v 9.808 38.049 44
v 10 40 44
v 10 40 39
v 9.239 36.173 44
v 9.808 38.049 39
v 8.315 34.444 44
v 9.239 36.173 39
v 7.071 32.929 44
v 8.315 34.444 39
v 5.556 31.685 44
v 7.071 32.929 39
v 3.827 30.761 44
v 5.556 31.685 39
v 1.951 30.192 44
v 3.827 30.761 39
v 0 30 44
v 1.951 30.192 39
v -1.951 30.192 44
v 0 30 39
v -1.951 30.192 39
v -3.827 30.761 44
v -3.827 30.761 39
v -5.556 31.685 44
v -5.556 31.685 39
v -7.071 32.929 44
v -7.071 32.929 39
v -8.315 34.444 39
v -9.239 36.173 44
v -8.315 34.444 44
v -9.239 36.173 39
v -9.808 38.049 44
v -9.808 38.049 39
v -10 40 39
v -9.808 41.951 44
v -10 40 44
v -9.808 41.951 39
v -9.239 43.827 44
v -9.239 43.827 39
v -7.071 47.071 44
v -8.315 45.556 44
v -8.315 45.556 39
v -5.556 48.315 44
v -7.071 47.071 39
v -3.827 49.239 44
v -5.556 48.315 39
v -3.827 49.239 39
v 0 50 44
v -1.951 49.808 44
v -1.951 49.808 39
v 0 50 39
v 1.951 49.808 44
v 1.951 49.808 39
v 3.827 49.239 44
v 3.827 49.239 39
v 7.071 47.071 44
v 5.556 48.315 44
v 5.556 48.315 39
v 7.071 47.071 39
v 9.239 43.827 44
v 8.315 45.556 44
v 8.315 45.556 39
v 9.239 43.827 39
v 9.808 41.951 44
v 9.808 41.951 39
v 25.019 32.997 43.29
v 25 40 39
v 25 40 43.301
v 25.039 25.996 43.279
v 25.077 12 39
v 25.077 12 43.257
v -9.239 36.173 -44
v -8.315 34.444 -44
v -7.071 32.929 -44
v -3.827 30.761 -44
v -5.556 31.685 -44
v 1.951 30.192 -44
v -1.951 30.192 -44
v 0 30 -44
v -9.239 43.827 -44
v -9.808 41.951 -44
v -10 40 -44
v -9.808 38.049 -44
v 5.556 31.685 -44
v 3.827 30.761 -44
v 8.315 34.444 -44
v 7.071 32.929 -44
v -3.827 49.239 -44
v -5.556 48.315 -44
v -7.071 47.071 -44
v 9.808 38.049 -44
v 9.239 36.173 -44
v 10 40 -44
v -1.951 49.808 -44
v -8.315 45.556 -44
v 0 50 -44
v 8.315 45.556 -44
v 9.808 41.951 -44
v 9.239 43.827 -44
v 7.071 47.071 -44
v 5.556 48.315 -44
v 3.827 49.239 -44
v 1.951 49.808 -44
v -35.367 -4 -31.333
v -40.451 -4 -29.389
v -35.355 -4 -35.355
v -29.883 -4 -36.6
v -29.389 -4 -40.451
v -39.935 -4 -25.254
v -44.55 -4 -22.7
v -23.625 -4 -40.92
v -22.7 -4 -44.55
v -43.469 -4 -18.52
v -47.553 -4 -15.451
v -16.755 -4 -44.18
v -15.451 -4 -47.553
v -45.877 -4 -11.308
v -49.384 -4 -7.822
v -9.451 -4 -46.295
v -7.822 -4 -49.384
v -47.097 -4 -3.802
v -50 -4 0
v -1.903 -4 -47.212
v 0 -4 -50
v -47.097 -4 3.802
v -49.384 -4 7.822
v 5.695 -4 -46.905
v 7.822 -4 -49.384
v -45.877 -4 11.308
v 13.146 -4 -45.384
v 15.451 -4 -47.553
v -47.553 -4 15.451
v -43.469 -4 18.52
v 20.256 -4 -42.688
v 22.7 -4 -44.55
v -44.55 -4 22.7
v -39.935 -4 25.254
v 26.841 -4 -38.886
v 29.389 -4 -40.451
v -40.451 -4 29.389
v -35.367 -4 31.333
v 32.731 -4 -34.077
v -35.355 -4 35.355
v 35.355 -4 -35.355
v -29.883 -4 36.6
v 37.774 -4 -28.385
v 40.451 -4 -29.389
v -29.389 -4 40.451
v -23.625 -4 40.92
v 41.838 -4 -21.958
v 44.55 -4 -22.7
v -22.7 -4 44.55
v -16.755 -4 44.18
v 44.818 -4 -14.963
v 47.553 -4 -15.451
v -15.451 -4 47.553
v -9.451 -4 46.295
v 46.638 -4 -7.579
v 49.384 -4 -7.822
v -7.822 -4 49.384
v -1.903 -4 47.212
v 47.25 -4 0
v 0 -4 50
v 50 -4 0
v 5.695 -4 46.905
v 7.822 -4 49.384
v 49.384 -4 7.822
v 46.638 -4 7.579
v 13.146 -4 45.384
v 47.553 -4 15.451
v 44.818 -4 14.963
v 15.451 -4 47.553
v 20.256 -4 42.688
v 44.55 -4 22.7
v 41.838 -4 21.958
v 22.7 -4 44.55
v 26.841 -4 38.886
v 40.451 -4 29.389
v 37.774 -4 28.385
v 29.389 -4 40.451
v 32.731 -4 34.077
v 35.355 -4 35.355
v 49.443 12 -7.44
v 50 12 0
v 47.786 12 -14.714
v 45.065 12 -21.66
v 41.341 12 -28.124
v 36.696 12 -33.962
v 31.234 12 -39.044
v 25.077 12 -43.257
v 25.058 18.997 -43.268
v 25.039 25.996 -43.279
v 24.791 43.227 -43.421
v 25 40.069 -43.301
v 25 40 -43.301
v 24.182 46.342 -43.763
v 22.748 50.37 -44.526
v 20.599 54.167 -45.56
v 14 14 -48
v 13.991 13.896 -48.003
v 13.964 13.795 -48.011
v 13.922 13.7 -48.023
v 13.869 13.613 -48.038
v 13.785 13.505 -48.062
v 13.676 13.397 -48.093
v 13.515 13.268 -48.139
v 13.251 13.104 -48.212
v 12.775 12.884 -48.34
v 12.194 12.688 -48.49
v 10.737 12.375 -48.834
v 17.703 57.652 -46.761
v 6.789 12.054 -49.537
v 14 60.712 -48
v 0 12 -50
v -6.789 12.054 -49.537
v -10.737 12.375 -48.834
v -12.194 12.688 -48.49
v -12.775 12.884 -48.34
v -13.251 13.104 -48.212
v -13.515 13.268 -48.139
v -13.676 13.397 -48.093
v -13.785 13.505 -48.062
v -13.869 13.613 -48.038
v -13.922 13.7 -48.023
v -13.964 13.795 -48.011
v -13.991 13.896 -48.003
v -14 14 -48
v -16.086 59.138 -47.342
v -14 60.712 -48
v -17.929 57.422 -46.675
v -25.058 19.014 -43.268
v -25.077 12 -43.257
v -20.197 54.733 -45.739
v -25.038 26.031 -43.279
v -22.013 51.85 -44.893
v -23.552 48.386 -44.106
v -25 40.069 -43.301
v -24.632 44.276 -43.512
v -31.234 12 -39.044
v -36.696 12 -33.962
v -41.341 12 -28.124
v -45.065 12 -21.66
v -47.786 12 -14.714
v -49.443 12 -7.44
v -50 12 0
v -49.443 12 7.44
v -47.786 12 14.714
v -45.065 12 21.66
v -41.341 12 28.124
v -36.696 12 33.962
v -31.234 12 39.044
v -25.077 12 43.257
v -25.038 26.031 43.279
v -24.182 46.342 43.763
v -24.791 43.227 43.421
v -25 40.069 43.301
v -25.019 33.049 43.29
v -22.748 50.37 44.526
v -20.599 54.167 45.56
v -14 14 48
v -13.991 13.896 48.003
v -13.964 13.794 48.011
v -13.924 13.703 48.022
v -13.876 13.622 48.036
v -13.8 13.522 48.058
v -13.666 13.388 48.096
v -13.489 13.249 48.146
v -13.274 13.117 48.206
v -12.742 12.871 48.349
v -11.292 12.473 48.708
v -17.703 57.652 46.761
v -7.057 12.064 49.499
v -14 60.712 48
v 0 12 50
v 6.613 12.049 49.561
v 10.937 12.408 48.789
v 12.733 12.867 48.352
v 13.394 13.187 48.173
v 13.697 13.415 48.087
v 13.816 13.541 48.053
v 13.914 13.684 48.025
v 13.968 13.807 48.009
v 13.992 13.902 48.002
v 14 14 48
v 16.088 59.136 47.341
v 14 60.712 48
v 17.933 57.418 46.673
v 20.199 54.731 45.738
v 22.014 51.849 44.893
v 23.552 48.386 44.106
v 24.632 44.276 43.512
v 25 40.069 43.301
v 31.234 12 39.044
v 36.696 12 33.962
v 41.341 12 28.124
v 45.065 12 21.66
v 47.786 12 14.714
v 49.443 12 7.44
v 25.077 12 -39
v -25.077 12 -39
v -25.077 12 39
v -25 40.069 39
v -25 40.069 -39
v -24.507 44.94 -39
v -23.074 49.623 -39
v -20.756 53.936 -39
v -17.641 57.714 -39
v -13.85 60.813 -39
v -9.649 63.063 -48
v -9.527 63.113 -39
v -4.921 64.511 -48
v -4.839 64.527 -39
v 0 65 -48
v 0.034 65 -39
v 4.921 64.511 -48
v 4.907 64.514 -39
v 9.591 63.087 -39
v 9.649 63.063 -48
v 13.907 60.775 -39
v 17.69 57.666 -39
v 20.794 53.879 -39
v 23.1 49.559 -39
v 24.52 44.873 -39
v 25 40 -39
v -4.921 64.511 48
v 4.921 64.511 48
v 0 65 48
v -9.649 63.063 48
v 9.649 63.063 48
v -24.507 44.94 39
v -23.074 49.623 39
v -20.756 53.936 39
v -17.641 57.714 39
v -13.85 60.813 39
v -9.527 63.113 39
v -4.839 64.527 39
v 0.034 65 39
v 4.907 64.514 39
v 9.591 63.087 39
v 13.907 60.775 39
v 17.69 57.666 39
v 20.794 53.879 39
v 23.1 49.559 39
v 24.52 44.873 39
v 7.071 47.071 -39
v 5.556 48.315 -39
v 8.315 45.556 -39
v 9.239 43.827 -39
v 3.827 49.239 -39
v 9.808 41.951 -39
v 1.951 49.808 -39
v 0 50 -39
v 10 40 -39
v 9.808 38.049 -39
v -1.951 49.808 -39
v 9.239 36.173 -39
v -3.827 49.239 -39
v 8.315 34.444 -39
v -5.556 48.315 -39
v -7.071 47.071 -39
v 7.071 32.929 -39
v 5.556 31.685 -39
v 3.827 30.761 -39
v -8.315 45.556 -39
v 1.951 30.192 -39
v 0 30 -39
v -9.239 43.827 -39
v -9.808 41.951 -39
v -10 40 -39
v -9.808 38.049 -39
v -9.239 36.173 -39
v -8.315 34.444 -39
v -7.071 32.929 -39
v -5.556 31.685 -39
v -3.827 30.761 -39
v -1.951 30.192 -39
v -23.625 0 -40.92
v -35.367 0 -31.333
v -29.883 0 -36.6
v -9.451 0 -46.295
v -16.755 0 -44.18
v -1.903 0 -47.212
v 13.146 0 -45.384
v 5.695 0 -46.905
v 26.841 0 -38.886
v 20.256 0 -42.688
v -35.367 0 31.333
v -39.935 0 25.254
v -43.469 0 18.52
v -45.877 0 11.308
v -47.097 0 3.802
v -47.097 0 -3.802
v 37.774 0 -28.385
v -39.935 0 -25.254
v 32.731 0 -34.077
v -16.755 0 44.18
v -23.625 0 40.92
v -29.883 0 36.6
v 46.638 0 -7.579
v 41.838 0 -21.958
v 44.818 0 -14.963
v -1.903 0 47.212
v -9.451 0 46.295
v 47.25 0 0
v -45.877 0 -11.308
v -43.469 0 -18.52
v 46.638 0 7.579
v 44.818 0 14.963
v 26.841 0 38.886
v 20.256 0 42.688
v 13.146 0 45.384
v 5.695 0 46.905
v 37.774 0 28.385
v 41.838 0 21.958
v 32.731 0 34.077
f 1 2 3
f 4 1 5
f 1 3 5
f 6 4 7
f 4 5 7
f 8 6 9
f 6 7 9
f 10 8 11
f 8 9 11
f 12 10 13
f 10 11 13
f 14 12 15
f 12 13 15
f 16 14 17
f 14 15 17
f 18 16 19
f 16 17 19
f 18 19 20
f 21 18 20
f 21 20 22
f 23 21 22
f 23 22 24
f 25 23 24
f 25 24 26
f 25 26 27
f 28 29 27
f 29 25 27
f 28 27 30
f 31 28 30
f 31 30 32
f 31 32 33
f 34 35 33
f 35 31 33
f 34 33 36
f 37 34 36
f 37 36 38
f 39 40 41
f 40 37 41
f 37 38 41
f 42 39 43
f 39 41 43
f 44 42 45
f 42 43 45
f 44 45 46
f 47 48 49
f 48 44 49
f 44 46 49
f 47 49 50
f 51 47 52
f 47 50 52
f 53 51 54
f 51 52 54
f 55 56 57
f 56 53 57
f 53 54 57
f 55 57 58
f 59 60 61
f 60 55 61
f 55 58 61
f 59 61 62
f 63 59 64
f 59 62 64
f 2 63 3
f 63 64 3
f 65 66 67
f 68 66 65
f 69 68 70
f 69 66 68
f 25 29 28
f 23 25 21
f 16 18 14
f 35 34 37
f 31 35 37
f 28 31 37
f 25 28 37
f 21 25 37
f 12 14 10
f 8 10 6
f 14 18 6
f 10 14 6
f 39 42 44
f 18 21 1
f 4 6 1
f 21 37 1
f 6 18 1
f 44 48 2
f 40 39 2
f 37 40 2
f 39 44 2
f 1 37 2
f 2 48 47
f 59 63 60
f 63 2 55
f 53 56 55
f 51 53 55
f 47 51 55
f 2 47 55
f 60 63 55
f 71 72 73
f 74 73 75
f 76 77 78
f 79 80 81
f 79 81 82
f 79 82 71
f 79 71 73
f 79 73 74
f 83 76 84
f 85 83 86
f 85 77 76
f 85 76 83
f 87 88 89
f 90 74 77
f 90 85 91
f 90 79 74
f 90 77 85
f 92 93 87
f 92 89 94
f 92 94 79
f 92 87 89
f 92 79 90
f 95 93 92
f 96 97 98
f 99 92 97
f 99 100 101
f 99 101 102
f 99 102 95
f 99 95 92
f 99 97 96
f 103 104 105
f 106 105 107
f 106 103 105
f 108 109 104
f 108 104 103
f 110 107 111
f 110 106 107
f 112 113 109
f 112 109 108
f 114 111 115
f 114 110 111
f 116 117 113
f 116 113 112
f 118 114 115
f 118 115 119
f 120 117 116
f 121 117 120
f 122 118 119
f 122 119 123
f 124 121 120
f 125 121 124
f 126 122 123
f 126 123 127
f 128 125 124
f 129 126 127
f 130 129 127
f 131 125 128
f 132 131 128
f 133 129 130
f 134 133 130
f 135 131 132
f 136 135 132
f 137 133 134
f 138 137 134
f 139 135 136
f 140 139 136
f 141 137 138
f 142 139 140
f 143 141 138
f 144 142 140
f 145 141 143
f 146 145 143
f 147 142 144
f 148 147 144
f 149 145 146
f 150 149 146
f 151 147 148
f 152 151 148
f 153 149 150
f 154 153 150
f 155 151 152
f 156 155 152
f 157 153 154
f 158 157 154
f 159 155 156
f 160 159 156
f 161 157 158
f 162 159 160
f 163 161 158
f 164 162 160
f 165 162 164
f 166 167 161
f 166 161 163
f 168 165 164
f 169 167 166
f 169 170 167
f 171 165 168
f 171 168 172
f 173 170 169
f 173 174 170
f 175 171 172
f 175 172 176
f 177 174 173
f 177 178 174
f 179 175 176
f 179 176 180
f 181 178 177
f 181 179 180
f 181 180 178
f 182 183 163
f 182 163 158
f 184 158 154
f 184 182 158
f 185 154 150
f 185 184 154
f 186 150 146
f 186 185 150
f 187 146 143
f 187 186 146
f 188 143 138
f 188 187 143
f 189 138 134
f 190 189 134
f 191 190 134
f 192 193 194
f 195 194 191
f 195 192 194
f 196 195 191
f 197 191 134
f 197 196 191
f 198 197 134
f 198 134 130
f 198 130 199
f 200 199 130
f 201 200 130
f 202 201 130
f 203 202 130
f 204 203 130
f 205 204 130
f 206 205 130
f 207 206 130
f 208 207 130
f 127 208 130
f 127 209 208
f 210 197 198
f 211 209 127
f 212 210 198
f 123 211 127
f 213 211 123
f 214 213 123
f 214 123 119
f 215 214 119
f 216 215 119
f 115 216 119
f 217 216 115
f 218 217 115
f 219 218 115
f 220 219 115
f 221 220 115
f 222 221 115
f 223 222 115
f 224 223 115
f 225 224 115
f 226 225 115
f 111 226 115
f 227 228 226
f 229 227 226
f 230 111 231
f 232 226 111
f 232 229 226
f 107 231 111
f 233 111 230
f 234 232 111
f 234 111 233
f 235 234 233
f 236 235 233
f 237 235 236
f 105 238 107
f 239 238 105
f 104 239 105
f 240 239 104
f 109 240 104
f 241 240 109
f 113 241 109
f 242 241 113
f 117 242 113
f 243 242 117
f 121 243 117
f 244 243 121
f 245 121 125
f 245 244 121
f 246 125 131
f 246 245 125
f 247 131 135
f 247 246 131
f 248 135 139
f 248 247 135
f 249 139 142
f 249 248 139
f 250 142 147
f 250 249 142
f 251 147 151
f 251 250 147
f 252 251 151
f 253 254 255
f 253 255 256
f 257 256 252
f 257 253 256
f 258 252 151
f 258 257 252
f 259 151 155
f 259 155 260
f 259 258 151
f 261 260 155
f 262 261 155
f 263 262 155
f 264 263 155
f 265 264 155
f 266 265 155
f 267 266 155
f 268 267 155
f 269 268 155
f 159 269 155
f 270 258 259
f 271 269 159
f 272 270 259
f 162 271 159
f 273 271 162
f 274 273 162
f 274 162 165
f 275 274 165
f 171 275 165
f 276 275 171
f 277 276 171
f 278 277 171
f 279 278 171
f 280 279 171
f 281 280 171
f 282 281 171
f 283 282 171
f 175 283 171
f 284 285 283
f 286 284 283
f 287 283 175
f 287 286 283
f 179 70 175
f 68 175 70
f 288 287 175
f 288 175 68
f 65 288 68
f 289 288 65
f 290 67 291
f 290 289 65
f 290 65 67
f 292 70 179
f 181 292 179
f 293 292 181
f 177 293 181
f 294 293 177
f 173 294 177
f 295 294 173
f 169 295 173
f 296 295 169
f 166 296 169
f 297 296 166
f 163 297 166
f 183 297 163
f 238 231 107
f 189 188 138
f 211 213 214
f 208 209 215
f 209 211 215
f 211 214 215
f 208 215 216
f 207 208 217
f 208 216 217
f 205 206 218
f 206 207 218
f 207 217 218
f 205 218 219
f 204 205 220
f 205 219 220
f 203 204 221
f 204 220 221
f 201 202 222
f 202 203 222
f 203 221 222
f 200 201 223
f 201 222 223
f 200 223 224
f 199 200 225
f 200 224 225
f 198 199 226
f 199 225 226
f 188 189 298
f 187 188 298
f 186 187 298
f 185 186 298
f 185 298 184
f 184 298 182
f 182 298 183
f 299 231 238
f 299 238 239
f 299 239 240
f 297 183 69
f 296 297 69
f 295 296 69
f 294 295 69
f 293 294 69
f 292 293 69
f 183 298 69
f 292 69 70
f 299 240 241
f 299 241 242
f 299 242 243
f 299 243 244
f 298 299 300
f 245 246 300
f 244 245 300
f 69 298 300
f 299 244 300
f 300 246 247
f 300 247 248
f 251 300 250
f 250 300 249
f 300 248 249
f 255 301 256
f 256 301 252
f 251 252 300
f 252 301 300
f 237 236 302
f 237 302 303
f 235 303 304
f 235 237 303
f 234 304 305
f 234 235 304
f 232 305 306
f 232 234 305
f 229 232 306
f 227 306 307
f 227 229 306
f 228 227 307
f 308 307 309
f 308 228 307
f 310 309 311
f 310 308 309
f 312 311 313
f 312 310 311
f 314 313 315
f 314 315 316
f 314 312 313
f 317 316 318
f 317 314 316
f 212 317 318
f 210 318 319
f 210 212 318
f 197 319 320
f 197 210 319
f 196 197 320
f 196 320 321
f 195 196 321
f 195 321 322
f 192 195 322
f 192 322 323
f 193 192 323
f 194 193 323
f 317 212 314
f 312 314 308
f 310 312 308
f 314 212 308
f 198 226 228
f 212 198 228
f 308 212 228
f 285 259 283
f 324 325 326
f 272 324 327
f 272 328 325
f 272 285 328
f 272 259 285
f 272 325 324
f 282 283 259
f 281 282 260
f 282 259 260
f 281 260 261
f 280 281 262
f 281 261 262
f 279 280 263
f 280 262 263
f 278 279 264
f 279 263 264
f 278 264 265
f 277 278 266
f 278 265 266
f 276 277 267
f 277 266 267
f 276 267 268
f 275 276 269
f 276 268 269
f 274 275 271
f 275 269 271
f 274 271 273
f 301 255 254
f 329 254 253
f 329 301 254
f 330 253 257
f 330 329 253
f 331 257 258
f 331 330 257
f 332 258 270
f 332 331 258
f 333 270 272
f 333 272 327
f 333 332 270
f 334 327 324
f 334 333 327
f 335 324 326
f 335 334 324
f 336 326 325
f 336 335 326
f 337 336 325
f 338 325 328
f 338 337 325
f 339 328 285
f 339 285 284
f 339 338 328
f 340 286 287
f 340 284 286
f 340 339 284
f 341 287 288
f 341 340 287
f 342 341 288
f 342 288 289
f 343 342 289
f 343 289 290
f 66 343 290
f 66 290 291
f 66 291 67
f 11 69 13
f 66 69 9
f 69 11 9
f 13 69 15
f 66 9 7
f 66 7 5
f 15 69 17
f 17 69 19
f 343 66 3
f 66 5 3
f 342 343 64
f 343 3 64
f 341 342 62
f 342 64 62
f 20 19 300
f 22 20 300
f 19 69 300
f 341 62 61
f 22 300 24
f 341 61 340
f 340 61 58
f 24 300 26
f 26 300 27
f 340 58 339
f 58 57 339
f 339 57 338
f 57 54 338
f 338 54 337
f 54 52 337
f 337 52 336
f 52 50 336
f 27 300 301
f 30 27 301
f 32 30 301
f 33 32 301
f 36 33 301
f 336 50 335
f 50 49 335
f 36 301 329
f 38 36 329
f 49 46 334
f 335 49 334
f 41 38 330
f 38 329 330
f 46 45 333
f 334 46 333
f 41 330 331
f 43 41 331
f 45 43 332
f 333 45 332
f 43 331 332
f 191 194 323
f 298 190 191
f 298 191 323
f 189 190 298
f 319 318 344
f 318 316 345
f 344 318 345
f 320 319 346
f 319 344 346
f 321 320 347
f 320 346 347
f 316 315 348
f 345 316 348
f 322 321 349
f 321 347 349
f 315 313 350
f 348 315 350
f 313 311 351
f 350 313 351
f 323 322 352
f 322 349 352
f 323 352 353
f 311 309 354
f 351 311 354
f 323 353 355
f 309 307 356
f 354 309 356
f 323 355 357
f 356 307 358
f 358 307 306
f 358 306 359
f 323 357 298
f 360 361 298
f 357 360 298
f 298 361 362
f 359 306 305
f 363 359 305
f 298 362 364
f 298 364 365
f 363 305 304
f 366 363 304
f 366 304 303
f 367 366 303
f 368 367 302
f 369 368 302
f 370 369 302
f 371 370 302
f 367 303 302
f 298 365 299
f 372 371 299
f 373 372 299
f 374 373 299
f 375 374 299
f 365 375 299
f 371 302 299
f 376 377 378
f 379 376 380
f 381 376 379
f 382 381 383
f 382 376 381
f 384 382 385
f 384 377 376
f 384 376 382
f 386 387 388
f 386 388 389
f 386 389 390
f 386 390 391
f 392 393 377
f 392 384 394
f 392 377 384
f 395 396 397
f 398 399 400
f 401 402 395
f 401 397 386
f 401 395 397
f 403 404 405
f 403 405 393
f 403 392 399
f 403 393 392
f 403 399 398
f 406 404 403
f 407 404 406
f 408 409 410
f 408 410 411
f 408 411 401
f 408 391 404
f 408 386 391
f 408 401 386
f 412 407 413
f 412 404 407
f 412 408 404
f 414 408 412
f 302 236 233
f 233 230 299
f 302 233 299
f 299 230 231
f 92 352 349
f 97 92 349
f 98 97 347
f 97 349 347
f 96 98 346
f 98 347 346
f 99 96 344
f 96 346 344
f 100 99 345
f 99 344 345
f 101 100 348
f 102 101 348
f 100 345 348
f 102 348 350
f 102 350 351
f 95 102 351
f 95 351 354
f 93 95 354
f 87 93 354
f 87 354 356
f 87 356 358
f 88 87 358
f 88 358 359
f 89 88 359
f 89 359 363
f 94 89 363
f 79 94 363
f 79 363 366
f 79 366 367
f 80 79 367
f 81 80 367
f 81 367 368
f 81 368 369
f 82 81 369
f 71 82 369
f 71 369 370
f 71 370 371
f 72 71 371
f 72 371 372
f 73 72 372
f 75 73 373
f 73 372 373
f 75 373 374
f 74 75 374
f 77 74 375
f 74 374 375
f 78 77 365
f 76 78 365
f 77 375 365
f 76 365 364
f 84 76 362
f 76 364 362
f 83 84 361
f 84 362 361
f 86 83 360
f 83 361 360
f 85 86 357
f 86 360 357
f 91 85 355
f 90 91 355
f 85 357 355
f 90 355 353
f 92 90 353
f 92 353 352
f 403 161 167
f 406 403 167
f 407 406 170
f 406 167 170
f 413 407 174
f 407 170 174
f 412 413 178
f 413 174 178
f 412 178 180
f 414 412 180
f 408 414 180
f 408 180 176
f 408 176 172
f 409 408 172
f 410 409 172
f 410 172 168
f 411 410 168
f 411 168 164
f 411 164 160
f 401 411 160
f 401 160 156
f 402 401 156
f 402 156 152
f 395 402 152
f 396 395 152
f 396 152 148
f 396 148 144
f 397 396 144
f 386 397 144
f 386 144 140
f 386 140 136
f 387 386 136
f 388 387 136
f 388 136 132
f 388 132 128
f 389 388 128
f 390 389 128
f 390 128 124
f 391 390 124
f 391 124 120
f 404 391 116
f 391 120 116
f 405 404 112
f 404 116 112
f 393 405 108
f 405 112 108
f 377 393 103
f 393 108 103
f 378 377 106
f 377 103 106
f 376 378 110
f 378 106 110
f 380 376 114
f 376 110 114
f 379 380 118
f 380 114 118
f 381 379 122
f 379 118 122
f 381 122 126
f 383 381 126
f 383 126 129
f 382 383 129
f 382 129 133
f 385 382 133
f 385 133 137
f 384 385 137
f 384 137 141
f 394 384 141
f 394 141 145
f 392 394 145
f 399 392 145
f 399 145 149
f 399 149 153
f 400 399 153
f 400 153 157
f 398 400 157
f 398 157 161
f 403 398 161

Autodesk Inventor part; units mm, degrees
ref_plane "YZ Plane" through (0, 0, 0) normal (1, 0, 0) x (0, 1, 0)
ref_plane "XZ Plane" through (0, 0, 0) normal (0, 1, 0) x (-1, 0, 0)
ref_plane "XY Plane" through (0, 0, 0) normal (0, 0, 1) x (1, 0, 0)
sketch "Sketch1" plane through (0, 0, 0) normal (0, 0, 1) x (1, 0, 0)
  line L0 (0, 0) -> (47.25, 0)
  line L1 (47.25, 0) -> (47.25, -4)
  line L2 (47.25, -4) -> (50, -4)
  line L3 (50, -4) -> (50, 65)
  line L4 (50, 65) -> (0, 65)
  line L5 (0, 65) -> (0, 0)
  dimension "d0" = 100
  dimension "d1" = 94.5
  dimension "d2" = 4
  dimension "d3" = 65
revolve "Revolution1" add sketch "Sketch1" angle 360 about axis through (0, 65, 0) along (0, -1, 0)
sketch "Sketch2" plane through (0, 0, 0) normal (0, 0, 1) x (1, 0, 0)
  line L0 (-50, 65) -> (-50, -4) projected
  line L1 (-50, 12) -> (50, 12)
  circle A0 centre (0, 40) radius 25
  line L2 (-50, 65) -> (50, 65) projected
  line L3 (0, 0) -> (0, 65) construction
  arc A1 (-50, 12) -> (-24.9999, 40.0686) centre (-53.3441, 40.1463) ccw
  arc A2 (24.9999, 40.0686) -> (50, 12) centre (53.3441, 40.1463) ccw
  line L4 (50, 65) -> (50, -4) projected
  point P0 (0, 12)
  point P1 (0, 65)
  dimension "d5" = 12
  dimension "d6" = 50
  dimension "d7" = 28.0686
  dimension "d8" = 28.0686
extrude "Extrusion1" cut sketch "Sketch2" along normal through all both and the other way through all contours L2 A0 A1 L0 | L2 L4 A2 A0
sketch "Sketch4" plane through (0, 0, 0) normal (1, 0, 0) x (0, 1, 0)
  line L0 (65, 50) -> (-4, 50) projected
  line L1 (12, 50) -> (12, 50)
  line L2 (14, -48) -> (65, -48)
  line L3 (14, 48) -> (65, 48)
  line L4 (65, 50) -> (65, -50) projected
  line L5 (0, 47.25) -> (0, -47.25) projected
  line L6 (65, -50) -> (-4, -50) projected
  arc A0 (12, 50) -> (14, 48) centre (14, 50) ccw
  line L7 (12, -50) -> (12, -50)
  arc A1 (14, -48) -> (12, -50) centre (14, -50) ccw
  line L8 (65, -39) -> (12, -39)
  line L9 (12, -39) -> (12, 39)
  line L10 (12, 39) -> (65, 39)
  line L11 (65, 39) -> (65, -39)
  line L12 (12, -50) -> (65, -50)
  line L13 (65, -48) -> (65, -50)
  line L14 (12, 50) -> (65, 50)
  line L15 (65, 50) -> (65, 48)
  point P0 (0, 0)
  point P1 (12, -48)
  point P2 (65, 39)
  dimension "d14" = 2
  dimension "d15" = 12
  dimension "d16" = 2
  dimension "d17" = 2
  dimension "d18" = 2
  dimension "d19" = 12
  dimension "d20" = 9
  dimension "d21" = 9
extrude "Extrusion2" cut sketch "Sketch4" along normal through all both and the other way through all
sketch "Sketch5" plane through (0, 40, 48) normal (0, 0, 1) x (1, 0, 0)
  line L0 (-31.289, -28) -> (31.289, -28) projected
  line L1 (-31.289, -28) -> (-25.0769, -28)
  spline S0 degree 7 poles (-24.9999, 0.0686) (-25.0047, -1.665) (-25.1331, -3.4008) (-25.3859, -5.1281) (-25.7625, -6.8362) (-26.2611, -8.5141) (-26.8789, -10.1513) (-27.8149, -12.1783) (-28.0274, -12.6153) (-28.2486, -13.0478) (-28.478, -13.4752) (-28.7156, -13.8974) (-28.961, -14.3139) (-29.4863, -15.1662) (-29.7674, -15.6012) (-30.057, -16.029) (-30.3544, -16.4489) (-30.6593, -16.8605) (-30.971, -17.2634) (-31.289, -17.6573) knots 0 0 0 0 0 0 0 0 0.63383 0.63383 0.63383 0.63383 0.63383 0.63383 0.810222 0.810222 0.810222 0.810222 0.810222 0.810222 1 1 1 1 1 1 1 1 projected
  line L2 (-31.289, -17.6573) -> (-31.289, -28) projected
  spline S1 degree 7 poles (31.289, -17.6573) (30.9729, -17.2657) (30.6629, -16.8652) (30.3597, -16.456) (30.0639, -16.0387) (29.7758, -15.6136) (29.4961, -15.1814) (28.9731, -14.3341) (28.7285, -13.9199) (28.4918, -13.5001) (28.263, -13.075) (28.0425, -12.645) (27.8305, -12.2104) (26.8905, -10.182) (26.269, -8.5404) (25.7672, -6.8576) (25.3883, -5.1443) (25.1339, -3.4117) (25.0047, -1.6704) (24.9999, 0.0686) knots 0 0 0 0 0 0 0 0 0.188676 0.188676 0.188676 0.188676 0.188676 0.188676 0.364186 0.364186 0.364186 0.364186 0.364186 0.364186 1 1 1 1 1 1 1 1 projected
  line L3 (31.289, -28) -> (31.289, -17.6573) projected
  arc A0 (24.9999, 0.0686) -> (31.289, -17.6573) centre (53.3441, 0.1463) ccw projected
  line L4 (24.9999, 0.0686) -> (25.0769, -28)
  line L5 (25.0769, -28) -> (31.289, -28)
  arc A1 (-31.289, -17.6573) -> (-24.9999, 0.0686) centre (-53.3441, 0.1463) ccw projected
  line L6 (-24.9999, 0.0686) -> (-25.0769, -28)
  point P0 (0, -40)
  point P1 (24.9999, -28)
extrude "Extrusion3" cut sketch "Sketch5" along normal through all both and the other way through all
sketch "Sketch6" plane through (0, 40, -39) normal (0, 0, 1) x (1, 0, 0)
  arc A0 (14, 20.7123) -> (-14, 20.7123) centre (0, 0) ccw projected
  circle A1 centre (0, 0) radius 10
  point P0 (0, -40)
  dimension "d26" = 20
extrude "Extrusion4" cut sketch "Sketch6" along normal blind 83 and the other way blind 5
equation "\"d8\" = d7"
equation "\"d21\" = d20"
properties part number "Arm 1 v0.1"
